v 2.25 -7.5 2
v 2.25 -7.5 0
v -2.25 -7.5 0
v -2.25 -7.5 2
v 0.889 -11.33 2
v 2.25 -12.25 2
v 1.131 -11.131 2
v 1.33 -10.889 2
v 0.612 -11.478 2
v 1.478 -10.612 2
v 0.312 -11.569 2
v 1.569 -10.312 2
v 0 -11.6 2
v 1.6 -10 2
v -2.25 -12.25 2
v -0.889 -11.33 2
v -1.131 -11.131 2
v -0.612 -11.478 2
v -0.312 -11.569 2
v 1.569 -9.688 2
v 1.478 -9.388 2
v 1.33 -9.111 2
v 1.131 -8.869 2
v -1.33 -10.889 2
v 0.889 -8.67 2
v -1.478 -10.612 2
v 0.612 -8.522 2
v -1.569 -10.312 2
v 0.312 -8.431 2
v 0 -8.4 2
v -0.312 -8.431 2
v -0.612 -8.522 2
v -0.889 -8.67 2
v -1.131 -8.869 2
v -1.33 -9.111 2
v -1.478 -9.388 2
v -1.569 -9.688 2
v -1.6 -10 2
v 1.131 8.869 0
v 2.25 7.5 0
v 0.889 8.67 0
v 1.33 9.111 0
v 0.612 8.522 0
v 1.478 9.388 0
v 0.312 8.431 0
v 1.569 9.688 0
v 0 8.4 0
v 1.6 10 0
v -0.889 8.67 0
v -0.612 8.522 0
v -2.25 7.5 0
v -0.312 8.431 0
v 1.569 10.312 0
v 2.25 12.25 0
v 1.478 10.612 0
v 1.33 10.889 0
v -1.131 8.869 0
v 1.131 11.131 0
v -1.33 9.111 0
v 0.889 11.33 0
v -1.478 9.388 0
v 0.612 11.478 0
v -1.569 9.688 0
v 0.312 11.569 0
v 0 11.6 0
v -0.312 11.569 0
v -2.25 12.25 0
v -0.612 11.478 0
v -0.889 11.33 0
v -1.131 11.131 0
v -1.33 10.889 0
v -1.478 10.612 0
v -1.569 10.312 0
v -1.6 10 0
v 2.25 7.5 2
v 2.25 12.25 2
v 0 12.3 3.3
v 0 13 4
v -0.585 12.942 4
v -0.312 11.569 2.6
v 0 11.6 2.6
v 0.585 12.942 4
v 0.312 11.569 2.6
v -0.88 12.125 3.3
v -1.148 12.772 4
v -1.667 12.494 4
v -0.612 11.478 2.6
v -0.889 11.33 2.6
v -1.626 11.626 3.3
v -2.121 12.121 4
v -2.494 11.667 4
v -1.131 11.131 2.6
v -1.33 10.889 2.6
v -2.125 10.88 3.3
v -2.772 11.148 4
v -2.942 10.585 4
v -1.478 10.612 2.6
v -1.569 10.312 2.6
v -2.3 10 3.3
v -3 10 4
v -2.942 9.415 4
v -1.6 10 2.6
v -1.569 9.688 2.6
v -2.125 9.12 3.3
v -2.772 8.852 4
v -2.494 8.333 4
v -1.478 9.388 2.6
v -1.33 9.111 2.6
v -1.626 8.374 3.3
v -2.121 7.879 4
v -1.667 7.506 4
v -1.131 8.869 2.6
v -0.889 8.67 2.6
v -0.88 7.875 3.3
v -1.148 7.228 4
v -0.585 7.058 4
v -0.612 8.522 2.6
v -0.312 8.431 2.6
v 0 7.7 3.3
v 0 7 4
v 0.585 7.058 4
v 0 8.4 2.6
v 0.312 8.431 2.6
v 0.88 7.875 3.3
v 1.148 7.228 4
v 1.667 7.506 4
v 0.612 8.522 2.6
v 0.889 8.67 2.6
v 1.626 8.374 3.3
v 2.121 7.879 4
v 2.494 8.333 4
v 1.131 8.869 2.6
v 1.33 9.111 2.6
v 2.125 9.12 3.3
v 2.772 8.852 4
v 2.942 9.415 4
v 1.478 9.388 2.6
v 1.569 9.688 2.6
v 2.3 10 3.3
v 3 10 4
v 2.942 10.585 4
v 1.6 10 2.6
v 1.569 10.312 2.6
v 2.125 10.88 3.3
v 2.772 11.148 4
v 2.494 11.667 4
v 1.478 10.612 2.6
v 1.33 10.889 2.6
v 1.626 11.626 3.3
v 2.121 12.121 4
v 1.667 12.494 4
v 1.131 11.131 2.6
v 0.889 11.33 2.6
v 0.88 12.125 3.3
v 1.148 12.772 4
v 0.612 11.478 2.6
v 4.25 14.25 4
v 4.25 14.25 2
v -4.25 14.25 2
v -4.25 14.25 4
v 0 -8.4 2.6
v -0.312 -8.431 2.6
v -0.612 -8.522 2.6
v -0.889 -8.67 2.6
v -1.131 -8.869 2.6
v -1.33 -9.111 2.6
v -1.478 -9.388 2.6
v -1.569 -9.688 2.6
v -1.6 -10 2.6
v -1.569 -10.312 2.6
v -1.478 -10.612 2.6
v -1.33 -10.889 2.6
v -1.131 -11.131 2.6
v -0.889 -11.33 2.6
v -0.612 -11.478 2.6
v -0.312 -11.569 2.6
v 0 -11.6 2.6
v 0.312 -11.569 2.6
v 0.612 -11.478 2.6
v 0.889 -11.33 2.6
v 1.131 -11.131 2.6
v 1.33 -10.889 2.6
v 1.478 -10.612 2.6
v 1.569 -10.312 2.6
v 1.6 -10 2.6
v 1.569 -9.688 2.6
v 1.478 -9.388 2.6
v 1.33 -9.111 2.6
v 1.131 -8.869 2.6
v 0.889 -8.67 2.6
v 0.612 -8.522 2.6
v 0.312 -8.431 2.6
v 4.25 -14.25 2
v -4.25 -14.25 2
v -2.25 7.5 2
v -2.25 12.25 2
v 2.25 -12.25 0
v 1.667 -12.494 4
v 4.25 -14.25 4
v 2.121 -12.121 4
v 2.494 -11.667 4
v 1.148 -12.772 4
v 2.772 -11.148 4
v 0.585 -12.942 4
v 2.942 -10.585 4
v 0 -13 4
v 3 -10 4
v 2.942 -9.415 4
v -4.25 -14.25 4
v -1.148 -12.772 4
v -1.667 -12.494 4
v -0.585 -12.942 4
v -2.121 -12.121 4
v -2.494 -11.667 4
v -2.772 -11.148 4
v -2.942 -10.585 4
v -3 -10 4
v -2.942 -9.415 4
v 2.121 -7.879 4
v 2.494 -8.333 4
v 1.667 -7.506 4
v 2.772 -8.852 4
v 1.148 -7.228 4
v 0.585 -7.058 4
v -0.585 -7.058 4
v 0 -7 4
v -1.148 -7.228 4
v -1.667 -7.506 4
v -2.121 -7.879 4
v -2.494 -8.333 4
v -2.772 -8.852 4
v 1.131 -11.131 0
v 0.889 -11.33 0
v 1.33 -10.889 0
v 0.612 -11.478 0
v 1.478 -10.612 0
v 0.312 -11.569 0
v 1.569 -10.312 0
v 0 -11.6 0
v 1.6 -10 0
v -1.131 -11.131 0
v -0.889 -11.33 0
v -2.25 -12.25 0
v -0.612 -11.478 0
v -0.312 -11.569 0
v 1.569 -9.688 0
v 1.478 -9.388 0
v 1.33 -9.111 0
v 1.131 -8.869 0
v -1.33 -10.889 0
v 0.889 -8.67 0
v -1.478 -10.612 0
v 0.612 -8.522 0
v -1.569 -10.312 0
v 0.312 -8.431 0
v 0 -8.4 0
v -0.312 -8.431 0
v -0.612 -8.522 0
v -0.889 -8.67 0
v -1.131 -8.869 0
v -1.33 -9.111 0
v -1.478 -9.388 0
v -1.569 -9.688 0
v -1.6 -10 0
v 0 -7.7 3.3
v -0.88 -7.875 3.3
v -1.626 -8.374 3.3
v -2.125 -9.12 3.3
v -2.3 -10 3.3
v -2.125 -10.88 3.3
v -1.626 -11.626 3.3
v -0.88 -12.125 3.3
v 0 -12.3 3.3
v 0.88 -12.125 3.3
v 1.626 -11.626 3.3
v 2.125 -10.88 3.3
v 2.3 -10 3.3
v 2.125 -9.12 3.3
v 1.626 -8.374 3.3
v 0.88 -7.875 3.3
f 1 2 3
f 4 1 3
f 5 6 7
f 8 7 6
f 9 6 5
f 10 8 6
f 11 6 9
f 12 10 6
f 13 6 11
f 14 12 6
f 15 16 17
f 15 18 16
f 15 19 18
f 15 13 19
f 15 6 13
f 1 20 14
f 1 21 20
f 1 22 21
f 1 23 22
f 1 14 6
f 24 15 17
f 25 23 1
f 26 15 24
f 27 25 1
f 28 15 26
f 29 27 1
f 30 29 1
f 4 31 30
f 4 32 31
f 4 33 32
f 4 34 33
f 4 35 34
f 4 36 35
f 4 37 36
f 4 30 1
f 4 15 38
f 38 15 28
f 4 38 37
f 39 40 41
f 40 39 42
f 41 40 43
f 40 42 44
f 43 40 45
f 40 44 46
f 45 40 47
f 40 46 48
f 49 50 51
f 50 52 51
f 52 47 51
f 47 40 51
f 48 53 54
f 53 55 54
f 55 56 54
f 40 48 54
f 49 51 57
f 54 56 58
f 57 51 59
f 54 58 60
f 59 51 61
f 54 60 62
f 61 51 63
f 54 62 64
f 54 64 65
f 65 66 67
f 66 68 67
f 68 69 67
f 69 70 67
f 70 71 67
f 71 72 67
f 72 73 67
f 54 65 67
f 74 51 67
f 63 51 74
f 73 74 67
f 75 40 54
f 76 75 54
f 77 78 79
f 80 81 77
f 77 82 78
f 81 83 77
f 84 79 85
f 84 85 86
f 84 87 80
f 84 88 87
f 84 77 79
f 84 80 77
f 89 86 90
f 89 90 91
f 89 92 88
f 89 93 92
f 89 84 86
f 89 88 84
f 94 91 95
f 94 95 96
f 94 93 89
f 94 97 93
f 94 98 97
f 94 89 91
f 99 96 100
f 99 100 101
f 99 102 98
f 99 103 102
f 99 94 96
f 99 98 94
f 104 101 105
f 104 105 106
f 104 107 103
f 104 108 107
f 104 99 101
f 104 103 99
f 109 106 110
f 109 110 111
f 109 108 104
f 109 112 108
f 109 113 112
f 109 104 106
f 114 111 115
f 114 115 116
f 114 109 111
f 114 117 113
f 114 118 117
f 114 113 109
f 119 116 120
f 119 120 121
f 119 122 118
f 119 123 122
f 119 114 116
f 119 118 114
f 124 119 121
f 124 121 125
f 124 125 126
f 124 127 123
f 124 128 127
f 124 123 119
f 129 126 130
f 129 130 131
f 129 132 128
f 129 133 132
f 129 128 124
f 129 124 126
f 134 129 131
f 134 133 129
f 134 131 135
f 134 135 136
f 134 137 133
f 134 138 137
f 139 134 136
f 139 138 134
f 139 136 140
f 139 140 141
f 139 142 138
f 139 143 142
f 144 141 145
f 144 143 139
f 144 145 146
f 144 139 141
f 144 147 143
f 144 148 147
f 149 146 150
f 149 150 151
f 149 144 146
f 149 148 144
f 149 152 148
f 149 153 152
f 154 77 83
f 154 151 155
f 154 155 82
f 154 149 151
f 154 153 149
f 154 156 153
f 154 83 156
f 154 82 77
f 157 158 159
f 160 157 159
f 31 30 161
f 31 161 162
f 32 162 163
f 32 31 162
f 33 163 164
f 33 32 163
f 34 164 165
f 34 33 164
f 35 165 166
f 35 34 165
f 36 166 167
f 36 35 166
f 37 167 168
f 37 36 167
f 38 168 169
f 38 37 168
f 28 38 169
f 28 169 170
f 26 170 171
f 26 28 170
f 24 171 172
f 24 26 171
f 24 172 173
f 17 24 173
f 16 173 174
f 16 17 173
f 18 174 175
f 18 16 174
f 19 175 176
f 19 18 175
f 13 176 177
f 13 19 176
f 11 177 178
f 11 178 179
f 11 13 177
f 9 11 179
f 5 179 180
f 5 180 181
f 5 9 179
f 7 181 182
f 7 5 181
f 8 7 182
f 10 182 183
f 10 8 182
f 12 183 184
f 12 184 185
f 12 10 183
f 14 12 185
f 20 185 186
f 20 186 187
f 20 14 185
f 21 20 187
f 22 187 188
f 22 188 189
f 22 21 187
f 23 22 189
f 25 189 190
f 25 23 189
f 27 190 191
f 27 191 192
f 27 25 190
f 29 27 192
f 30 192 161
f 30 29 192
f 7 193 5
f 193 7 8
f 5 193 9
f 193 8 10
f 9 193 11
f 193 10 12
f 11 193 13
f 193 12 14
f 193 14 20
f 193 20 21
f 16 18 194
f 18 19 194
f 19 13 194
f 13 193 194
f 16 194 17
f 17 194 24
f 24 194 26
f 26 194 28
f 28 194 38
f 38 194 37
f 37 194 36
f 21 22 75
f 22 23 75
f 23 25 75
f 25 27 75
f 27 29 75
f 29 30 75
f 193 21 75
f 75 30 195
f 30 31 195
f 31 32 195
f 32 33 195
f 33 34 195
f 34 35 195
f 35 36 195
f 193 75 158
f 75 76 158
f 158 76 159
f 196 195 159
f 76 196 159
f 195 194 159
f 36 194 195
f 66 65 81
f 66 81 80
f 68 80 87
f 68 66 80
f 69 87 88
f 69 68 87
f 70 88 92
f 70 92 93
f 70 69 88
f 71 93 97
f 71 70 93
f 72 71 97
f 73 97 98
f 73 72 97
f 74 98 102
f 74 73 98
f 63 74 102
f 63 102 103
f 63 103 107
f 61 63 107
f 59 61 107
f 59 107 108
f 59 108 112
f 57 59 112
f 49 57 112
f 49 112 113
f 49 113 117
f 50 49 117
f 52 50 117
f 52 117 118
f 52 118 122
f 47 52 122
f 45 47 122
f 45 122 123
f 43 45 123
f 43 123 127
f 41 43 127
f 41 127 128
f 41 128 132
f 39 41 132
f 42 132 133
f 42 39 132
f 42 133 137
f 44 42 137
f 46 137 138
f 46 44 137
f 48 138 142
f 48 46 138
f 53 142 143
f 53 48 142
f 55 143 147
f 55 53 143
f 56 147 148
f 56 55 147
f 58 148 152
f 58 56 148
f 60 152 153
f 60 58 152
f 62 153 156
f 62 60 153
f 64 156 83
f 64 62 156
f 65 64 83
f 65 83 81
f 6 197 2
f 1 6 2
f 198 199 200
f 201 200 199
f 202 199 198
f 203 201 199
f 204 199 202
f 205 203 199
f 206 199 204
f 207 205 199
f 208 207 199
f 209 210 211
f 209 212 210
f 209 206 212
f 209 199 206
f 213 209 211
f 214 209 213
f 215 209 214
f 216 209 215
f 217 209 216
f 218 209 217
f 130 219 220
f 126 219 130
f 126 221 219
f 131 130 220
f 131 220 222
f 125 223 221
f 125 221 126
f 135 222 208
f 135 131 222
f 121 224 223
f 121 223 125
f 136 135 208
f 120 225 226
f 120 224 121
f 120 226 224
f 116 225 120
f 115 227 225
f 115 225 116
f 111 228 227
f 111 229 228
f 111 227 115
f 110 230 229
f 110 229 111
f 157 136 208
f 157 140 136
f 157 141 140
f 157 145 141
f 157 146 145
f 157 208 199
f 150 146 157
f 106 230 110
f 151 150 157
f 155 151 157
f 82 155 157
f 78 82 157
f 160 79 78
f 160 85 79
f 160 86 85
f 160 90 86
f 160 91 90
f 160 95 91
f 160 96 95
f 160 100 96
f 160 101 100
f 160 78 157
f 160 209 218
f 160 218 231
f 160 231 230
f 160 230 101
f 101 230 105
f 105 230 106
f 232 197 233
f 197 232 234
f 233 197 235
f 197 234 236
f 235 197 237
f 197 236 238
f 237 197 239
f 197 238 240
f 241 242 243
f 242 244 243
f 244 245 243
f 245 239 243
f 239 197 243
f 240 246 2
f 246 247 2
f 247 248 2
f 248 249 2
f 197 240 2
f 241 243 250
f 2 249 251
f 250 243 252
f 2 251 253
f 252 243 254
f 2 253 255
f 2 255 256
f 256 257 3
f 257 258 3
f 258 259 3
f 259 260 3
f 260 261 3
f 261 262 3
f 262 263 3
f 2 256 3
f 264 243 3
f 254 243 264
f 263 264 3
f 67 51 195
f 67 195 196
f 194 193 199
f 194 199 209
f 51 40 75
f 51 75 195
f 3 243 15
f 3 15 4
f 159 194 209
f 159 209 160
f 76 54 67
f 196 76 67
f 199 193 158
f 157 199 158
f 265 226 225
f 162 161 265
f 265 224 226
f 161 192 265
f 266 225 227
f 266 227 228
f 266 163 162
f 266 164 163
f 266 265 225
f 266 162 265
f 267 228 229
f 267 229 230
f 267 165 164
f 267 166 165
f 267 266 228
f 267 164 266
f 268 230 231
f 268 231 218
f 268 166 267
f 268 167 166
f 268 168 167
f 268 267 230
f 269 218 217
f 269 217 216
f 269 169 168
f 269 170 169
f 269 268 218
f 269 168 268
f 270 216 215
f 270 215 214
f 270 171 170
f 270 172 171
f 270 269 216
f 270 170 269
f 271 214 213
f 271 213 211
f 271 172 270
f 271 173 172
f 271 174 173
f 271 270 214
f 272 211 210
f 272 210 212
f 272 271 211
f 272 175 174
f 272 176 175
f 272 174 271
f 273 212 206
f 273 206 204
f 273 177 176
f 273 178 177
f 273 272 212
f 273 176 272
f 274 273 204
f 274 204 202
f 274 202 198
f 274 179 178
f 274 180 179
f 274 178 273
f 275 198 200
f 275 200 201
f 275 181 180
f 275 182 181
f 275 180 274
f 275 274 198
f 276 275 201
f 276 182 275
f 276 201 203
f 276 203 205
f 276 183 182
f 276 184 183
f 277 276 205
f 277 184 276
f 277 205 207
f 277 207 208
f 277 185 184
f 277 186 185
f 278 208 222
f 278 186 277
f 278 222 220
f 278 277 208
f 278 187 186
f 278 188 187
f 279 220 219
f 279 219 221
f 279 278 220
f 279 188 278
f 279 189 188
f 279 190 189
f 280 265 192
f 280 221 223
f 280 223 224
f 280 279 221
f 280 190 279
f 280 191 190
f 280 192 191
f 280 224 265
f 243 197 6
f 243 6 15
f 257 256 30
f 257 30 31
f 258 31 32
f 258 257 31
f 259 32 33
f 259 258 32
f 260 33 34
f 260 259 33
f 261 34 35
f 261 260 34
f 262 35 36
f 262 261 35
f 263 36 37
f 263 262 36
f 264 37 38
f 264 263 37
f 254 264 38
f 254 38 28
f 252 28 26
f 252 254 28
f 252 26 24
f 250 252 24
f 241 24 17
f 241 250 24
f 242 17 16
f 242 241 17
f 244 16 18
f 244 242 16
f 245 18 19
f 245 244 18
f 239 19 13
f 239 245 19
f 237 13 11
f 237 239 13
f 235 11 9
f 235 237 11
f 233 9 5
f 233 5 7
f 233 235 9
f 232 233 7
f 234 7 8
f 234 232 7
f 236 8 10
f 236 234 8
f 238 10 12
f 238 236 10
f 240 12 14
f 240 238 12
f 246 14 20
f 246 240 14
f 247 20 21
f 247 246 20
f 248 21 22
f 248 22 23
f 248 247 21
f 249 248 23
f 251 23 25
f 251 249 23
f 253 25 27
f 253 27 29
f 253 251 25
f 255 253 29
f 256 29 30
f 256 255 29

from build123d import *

# Parameters (mm, degrees)
SKETCH1_W             = 4.75
SKETCH1_H             = 4.5
SKETCH1_R             = 1.6
BOSS_EXTRUDE1_DEPTH   = 2
BOSS_EXTRUDE1_2_DEPTH = 2
BOSS_EXTRUDE2_START   = 2
SKETCH1_3_W           = 28.5
SKETCH1_3_H           = 8.5
SKETCH1_3_W_2         = 24.5
SKETCH1_3_H_2         = 4.5
SKETCH1_3_R           = 1.6
SKETCH1_3_W_3         = 15
SKETCH1_3_W_4         = 4.75
BOSS_EXTRUDE2_DEPTH   = 2
CHAMFER1_SIZE         = 1.4


with BuildPart() as part:
    # Sketch1 → Boss-Extrude1 (new body)
    with BuildSketch(Plane(origin=(0, 0, 0), x_dir=(0, 1, 0), z_dir=(0, 0, 1))):
        with Locations((-9.875, 0)):
            Rectangle(SKETCH1_W, SKETCH1_H)
        with Locations((-10, 0)):
            Circle(SKETCH1_R, mode=Mode.SUBTRACT)
    extrude(amount=BOSS_EXTRUDE1_DEPTH)


with BuildPart() as body_2:
    # Sketch1 → Boss-Extrude1 2 (new body)
    with BuildSketch(Plane(origin=(0, 0, 0), x_dir=(0, 1, 0), z_dir=(0, 0, 1))):
        with Locations((9.875, 0)):
            Rectangle(SKETCH1_W, SKETCH1_H)
        with Locations((10, 0)):
            Circle(SKETCH1_R, mode=Mode.SUBTRACT)
    extrude(amount=BOSS_EXTRUDE1_2_DEPTH)

    # Sketch1<3> → Boss-Extrude2 (add)
    with BuildSketch(Plane(origin=(0, 0, 0), x_dir=(0, 1, 0), z_dir=(0, 0, 1)).offset(BOSS_EXTRUDE2_START)):
        Rectangle(SKETCH1_3_W, SKETCH1_3_H)
        Rectangle(SKETCH1_3_W_2, SKETCH1_3_H_2, mode=Mode.SUBTRACT)
        Rectangle(SKETCH1_3_W_2, SKETCH1_3_H_2)
        with Locations((10, 0)):
            Circle(SKETCH1_3_R, mode=Mode.SUBTRACT)
        with Locations((-10, 0)):
            Circle(SKETCH1_3_R, mode=Mode.SUBTRACT)
        Rectangle(SKETCH1_3_W_3, SKETCH1_3_H_2)
        with Locations((-9.875, 0)):
            Rectangle(SKETCH1_3_W_4, SKETCH1_3_H_2)
        with Locations((-10, 0)):
            Circle(SKETCH1_3_R, mode=Mode.SUBTRACT)
    extrude(amount=BOSS_EXTRUDE2_DEPTH)

    # Chamfer1
    chamfer1_edges = [body_2.edges().sort_by_distance(p)[0] for p in [
        (0, -11.6, 4),
        (0, 8.4, 4),
    ]]
    chamfer(chamfer1_edges, length=CHAMFER1_SIZE)


solid = Compound([part.part, body_2.part])
